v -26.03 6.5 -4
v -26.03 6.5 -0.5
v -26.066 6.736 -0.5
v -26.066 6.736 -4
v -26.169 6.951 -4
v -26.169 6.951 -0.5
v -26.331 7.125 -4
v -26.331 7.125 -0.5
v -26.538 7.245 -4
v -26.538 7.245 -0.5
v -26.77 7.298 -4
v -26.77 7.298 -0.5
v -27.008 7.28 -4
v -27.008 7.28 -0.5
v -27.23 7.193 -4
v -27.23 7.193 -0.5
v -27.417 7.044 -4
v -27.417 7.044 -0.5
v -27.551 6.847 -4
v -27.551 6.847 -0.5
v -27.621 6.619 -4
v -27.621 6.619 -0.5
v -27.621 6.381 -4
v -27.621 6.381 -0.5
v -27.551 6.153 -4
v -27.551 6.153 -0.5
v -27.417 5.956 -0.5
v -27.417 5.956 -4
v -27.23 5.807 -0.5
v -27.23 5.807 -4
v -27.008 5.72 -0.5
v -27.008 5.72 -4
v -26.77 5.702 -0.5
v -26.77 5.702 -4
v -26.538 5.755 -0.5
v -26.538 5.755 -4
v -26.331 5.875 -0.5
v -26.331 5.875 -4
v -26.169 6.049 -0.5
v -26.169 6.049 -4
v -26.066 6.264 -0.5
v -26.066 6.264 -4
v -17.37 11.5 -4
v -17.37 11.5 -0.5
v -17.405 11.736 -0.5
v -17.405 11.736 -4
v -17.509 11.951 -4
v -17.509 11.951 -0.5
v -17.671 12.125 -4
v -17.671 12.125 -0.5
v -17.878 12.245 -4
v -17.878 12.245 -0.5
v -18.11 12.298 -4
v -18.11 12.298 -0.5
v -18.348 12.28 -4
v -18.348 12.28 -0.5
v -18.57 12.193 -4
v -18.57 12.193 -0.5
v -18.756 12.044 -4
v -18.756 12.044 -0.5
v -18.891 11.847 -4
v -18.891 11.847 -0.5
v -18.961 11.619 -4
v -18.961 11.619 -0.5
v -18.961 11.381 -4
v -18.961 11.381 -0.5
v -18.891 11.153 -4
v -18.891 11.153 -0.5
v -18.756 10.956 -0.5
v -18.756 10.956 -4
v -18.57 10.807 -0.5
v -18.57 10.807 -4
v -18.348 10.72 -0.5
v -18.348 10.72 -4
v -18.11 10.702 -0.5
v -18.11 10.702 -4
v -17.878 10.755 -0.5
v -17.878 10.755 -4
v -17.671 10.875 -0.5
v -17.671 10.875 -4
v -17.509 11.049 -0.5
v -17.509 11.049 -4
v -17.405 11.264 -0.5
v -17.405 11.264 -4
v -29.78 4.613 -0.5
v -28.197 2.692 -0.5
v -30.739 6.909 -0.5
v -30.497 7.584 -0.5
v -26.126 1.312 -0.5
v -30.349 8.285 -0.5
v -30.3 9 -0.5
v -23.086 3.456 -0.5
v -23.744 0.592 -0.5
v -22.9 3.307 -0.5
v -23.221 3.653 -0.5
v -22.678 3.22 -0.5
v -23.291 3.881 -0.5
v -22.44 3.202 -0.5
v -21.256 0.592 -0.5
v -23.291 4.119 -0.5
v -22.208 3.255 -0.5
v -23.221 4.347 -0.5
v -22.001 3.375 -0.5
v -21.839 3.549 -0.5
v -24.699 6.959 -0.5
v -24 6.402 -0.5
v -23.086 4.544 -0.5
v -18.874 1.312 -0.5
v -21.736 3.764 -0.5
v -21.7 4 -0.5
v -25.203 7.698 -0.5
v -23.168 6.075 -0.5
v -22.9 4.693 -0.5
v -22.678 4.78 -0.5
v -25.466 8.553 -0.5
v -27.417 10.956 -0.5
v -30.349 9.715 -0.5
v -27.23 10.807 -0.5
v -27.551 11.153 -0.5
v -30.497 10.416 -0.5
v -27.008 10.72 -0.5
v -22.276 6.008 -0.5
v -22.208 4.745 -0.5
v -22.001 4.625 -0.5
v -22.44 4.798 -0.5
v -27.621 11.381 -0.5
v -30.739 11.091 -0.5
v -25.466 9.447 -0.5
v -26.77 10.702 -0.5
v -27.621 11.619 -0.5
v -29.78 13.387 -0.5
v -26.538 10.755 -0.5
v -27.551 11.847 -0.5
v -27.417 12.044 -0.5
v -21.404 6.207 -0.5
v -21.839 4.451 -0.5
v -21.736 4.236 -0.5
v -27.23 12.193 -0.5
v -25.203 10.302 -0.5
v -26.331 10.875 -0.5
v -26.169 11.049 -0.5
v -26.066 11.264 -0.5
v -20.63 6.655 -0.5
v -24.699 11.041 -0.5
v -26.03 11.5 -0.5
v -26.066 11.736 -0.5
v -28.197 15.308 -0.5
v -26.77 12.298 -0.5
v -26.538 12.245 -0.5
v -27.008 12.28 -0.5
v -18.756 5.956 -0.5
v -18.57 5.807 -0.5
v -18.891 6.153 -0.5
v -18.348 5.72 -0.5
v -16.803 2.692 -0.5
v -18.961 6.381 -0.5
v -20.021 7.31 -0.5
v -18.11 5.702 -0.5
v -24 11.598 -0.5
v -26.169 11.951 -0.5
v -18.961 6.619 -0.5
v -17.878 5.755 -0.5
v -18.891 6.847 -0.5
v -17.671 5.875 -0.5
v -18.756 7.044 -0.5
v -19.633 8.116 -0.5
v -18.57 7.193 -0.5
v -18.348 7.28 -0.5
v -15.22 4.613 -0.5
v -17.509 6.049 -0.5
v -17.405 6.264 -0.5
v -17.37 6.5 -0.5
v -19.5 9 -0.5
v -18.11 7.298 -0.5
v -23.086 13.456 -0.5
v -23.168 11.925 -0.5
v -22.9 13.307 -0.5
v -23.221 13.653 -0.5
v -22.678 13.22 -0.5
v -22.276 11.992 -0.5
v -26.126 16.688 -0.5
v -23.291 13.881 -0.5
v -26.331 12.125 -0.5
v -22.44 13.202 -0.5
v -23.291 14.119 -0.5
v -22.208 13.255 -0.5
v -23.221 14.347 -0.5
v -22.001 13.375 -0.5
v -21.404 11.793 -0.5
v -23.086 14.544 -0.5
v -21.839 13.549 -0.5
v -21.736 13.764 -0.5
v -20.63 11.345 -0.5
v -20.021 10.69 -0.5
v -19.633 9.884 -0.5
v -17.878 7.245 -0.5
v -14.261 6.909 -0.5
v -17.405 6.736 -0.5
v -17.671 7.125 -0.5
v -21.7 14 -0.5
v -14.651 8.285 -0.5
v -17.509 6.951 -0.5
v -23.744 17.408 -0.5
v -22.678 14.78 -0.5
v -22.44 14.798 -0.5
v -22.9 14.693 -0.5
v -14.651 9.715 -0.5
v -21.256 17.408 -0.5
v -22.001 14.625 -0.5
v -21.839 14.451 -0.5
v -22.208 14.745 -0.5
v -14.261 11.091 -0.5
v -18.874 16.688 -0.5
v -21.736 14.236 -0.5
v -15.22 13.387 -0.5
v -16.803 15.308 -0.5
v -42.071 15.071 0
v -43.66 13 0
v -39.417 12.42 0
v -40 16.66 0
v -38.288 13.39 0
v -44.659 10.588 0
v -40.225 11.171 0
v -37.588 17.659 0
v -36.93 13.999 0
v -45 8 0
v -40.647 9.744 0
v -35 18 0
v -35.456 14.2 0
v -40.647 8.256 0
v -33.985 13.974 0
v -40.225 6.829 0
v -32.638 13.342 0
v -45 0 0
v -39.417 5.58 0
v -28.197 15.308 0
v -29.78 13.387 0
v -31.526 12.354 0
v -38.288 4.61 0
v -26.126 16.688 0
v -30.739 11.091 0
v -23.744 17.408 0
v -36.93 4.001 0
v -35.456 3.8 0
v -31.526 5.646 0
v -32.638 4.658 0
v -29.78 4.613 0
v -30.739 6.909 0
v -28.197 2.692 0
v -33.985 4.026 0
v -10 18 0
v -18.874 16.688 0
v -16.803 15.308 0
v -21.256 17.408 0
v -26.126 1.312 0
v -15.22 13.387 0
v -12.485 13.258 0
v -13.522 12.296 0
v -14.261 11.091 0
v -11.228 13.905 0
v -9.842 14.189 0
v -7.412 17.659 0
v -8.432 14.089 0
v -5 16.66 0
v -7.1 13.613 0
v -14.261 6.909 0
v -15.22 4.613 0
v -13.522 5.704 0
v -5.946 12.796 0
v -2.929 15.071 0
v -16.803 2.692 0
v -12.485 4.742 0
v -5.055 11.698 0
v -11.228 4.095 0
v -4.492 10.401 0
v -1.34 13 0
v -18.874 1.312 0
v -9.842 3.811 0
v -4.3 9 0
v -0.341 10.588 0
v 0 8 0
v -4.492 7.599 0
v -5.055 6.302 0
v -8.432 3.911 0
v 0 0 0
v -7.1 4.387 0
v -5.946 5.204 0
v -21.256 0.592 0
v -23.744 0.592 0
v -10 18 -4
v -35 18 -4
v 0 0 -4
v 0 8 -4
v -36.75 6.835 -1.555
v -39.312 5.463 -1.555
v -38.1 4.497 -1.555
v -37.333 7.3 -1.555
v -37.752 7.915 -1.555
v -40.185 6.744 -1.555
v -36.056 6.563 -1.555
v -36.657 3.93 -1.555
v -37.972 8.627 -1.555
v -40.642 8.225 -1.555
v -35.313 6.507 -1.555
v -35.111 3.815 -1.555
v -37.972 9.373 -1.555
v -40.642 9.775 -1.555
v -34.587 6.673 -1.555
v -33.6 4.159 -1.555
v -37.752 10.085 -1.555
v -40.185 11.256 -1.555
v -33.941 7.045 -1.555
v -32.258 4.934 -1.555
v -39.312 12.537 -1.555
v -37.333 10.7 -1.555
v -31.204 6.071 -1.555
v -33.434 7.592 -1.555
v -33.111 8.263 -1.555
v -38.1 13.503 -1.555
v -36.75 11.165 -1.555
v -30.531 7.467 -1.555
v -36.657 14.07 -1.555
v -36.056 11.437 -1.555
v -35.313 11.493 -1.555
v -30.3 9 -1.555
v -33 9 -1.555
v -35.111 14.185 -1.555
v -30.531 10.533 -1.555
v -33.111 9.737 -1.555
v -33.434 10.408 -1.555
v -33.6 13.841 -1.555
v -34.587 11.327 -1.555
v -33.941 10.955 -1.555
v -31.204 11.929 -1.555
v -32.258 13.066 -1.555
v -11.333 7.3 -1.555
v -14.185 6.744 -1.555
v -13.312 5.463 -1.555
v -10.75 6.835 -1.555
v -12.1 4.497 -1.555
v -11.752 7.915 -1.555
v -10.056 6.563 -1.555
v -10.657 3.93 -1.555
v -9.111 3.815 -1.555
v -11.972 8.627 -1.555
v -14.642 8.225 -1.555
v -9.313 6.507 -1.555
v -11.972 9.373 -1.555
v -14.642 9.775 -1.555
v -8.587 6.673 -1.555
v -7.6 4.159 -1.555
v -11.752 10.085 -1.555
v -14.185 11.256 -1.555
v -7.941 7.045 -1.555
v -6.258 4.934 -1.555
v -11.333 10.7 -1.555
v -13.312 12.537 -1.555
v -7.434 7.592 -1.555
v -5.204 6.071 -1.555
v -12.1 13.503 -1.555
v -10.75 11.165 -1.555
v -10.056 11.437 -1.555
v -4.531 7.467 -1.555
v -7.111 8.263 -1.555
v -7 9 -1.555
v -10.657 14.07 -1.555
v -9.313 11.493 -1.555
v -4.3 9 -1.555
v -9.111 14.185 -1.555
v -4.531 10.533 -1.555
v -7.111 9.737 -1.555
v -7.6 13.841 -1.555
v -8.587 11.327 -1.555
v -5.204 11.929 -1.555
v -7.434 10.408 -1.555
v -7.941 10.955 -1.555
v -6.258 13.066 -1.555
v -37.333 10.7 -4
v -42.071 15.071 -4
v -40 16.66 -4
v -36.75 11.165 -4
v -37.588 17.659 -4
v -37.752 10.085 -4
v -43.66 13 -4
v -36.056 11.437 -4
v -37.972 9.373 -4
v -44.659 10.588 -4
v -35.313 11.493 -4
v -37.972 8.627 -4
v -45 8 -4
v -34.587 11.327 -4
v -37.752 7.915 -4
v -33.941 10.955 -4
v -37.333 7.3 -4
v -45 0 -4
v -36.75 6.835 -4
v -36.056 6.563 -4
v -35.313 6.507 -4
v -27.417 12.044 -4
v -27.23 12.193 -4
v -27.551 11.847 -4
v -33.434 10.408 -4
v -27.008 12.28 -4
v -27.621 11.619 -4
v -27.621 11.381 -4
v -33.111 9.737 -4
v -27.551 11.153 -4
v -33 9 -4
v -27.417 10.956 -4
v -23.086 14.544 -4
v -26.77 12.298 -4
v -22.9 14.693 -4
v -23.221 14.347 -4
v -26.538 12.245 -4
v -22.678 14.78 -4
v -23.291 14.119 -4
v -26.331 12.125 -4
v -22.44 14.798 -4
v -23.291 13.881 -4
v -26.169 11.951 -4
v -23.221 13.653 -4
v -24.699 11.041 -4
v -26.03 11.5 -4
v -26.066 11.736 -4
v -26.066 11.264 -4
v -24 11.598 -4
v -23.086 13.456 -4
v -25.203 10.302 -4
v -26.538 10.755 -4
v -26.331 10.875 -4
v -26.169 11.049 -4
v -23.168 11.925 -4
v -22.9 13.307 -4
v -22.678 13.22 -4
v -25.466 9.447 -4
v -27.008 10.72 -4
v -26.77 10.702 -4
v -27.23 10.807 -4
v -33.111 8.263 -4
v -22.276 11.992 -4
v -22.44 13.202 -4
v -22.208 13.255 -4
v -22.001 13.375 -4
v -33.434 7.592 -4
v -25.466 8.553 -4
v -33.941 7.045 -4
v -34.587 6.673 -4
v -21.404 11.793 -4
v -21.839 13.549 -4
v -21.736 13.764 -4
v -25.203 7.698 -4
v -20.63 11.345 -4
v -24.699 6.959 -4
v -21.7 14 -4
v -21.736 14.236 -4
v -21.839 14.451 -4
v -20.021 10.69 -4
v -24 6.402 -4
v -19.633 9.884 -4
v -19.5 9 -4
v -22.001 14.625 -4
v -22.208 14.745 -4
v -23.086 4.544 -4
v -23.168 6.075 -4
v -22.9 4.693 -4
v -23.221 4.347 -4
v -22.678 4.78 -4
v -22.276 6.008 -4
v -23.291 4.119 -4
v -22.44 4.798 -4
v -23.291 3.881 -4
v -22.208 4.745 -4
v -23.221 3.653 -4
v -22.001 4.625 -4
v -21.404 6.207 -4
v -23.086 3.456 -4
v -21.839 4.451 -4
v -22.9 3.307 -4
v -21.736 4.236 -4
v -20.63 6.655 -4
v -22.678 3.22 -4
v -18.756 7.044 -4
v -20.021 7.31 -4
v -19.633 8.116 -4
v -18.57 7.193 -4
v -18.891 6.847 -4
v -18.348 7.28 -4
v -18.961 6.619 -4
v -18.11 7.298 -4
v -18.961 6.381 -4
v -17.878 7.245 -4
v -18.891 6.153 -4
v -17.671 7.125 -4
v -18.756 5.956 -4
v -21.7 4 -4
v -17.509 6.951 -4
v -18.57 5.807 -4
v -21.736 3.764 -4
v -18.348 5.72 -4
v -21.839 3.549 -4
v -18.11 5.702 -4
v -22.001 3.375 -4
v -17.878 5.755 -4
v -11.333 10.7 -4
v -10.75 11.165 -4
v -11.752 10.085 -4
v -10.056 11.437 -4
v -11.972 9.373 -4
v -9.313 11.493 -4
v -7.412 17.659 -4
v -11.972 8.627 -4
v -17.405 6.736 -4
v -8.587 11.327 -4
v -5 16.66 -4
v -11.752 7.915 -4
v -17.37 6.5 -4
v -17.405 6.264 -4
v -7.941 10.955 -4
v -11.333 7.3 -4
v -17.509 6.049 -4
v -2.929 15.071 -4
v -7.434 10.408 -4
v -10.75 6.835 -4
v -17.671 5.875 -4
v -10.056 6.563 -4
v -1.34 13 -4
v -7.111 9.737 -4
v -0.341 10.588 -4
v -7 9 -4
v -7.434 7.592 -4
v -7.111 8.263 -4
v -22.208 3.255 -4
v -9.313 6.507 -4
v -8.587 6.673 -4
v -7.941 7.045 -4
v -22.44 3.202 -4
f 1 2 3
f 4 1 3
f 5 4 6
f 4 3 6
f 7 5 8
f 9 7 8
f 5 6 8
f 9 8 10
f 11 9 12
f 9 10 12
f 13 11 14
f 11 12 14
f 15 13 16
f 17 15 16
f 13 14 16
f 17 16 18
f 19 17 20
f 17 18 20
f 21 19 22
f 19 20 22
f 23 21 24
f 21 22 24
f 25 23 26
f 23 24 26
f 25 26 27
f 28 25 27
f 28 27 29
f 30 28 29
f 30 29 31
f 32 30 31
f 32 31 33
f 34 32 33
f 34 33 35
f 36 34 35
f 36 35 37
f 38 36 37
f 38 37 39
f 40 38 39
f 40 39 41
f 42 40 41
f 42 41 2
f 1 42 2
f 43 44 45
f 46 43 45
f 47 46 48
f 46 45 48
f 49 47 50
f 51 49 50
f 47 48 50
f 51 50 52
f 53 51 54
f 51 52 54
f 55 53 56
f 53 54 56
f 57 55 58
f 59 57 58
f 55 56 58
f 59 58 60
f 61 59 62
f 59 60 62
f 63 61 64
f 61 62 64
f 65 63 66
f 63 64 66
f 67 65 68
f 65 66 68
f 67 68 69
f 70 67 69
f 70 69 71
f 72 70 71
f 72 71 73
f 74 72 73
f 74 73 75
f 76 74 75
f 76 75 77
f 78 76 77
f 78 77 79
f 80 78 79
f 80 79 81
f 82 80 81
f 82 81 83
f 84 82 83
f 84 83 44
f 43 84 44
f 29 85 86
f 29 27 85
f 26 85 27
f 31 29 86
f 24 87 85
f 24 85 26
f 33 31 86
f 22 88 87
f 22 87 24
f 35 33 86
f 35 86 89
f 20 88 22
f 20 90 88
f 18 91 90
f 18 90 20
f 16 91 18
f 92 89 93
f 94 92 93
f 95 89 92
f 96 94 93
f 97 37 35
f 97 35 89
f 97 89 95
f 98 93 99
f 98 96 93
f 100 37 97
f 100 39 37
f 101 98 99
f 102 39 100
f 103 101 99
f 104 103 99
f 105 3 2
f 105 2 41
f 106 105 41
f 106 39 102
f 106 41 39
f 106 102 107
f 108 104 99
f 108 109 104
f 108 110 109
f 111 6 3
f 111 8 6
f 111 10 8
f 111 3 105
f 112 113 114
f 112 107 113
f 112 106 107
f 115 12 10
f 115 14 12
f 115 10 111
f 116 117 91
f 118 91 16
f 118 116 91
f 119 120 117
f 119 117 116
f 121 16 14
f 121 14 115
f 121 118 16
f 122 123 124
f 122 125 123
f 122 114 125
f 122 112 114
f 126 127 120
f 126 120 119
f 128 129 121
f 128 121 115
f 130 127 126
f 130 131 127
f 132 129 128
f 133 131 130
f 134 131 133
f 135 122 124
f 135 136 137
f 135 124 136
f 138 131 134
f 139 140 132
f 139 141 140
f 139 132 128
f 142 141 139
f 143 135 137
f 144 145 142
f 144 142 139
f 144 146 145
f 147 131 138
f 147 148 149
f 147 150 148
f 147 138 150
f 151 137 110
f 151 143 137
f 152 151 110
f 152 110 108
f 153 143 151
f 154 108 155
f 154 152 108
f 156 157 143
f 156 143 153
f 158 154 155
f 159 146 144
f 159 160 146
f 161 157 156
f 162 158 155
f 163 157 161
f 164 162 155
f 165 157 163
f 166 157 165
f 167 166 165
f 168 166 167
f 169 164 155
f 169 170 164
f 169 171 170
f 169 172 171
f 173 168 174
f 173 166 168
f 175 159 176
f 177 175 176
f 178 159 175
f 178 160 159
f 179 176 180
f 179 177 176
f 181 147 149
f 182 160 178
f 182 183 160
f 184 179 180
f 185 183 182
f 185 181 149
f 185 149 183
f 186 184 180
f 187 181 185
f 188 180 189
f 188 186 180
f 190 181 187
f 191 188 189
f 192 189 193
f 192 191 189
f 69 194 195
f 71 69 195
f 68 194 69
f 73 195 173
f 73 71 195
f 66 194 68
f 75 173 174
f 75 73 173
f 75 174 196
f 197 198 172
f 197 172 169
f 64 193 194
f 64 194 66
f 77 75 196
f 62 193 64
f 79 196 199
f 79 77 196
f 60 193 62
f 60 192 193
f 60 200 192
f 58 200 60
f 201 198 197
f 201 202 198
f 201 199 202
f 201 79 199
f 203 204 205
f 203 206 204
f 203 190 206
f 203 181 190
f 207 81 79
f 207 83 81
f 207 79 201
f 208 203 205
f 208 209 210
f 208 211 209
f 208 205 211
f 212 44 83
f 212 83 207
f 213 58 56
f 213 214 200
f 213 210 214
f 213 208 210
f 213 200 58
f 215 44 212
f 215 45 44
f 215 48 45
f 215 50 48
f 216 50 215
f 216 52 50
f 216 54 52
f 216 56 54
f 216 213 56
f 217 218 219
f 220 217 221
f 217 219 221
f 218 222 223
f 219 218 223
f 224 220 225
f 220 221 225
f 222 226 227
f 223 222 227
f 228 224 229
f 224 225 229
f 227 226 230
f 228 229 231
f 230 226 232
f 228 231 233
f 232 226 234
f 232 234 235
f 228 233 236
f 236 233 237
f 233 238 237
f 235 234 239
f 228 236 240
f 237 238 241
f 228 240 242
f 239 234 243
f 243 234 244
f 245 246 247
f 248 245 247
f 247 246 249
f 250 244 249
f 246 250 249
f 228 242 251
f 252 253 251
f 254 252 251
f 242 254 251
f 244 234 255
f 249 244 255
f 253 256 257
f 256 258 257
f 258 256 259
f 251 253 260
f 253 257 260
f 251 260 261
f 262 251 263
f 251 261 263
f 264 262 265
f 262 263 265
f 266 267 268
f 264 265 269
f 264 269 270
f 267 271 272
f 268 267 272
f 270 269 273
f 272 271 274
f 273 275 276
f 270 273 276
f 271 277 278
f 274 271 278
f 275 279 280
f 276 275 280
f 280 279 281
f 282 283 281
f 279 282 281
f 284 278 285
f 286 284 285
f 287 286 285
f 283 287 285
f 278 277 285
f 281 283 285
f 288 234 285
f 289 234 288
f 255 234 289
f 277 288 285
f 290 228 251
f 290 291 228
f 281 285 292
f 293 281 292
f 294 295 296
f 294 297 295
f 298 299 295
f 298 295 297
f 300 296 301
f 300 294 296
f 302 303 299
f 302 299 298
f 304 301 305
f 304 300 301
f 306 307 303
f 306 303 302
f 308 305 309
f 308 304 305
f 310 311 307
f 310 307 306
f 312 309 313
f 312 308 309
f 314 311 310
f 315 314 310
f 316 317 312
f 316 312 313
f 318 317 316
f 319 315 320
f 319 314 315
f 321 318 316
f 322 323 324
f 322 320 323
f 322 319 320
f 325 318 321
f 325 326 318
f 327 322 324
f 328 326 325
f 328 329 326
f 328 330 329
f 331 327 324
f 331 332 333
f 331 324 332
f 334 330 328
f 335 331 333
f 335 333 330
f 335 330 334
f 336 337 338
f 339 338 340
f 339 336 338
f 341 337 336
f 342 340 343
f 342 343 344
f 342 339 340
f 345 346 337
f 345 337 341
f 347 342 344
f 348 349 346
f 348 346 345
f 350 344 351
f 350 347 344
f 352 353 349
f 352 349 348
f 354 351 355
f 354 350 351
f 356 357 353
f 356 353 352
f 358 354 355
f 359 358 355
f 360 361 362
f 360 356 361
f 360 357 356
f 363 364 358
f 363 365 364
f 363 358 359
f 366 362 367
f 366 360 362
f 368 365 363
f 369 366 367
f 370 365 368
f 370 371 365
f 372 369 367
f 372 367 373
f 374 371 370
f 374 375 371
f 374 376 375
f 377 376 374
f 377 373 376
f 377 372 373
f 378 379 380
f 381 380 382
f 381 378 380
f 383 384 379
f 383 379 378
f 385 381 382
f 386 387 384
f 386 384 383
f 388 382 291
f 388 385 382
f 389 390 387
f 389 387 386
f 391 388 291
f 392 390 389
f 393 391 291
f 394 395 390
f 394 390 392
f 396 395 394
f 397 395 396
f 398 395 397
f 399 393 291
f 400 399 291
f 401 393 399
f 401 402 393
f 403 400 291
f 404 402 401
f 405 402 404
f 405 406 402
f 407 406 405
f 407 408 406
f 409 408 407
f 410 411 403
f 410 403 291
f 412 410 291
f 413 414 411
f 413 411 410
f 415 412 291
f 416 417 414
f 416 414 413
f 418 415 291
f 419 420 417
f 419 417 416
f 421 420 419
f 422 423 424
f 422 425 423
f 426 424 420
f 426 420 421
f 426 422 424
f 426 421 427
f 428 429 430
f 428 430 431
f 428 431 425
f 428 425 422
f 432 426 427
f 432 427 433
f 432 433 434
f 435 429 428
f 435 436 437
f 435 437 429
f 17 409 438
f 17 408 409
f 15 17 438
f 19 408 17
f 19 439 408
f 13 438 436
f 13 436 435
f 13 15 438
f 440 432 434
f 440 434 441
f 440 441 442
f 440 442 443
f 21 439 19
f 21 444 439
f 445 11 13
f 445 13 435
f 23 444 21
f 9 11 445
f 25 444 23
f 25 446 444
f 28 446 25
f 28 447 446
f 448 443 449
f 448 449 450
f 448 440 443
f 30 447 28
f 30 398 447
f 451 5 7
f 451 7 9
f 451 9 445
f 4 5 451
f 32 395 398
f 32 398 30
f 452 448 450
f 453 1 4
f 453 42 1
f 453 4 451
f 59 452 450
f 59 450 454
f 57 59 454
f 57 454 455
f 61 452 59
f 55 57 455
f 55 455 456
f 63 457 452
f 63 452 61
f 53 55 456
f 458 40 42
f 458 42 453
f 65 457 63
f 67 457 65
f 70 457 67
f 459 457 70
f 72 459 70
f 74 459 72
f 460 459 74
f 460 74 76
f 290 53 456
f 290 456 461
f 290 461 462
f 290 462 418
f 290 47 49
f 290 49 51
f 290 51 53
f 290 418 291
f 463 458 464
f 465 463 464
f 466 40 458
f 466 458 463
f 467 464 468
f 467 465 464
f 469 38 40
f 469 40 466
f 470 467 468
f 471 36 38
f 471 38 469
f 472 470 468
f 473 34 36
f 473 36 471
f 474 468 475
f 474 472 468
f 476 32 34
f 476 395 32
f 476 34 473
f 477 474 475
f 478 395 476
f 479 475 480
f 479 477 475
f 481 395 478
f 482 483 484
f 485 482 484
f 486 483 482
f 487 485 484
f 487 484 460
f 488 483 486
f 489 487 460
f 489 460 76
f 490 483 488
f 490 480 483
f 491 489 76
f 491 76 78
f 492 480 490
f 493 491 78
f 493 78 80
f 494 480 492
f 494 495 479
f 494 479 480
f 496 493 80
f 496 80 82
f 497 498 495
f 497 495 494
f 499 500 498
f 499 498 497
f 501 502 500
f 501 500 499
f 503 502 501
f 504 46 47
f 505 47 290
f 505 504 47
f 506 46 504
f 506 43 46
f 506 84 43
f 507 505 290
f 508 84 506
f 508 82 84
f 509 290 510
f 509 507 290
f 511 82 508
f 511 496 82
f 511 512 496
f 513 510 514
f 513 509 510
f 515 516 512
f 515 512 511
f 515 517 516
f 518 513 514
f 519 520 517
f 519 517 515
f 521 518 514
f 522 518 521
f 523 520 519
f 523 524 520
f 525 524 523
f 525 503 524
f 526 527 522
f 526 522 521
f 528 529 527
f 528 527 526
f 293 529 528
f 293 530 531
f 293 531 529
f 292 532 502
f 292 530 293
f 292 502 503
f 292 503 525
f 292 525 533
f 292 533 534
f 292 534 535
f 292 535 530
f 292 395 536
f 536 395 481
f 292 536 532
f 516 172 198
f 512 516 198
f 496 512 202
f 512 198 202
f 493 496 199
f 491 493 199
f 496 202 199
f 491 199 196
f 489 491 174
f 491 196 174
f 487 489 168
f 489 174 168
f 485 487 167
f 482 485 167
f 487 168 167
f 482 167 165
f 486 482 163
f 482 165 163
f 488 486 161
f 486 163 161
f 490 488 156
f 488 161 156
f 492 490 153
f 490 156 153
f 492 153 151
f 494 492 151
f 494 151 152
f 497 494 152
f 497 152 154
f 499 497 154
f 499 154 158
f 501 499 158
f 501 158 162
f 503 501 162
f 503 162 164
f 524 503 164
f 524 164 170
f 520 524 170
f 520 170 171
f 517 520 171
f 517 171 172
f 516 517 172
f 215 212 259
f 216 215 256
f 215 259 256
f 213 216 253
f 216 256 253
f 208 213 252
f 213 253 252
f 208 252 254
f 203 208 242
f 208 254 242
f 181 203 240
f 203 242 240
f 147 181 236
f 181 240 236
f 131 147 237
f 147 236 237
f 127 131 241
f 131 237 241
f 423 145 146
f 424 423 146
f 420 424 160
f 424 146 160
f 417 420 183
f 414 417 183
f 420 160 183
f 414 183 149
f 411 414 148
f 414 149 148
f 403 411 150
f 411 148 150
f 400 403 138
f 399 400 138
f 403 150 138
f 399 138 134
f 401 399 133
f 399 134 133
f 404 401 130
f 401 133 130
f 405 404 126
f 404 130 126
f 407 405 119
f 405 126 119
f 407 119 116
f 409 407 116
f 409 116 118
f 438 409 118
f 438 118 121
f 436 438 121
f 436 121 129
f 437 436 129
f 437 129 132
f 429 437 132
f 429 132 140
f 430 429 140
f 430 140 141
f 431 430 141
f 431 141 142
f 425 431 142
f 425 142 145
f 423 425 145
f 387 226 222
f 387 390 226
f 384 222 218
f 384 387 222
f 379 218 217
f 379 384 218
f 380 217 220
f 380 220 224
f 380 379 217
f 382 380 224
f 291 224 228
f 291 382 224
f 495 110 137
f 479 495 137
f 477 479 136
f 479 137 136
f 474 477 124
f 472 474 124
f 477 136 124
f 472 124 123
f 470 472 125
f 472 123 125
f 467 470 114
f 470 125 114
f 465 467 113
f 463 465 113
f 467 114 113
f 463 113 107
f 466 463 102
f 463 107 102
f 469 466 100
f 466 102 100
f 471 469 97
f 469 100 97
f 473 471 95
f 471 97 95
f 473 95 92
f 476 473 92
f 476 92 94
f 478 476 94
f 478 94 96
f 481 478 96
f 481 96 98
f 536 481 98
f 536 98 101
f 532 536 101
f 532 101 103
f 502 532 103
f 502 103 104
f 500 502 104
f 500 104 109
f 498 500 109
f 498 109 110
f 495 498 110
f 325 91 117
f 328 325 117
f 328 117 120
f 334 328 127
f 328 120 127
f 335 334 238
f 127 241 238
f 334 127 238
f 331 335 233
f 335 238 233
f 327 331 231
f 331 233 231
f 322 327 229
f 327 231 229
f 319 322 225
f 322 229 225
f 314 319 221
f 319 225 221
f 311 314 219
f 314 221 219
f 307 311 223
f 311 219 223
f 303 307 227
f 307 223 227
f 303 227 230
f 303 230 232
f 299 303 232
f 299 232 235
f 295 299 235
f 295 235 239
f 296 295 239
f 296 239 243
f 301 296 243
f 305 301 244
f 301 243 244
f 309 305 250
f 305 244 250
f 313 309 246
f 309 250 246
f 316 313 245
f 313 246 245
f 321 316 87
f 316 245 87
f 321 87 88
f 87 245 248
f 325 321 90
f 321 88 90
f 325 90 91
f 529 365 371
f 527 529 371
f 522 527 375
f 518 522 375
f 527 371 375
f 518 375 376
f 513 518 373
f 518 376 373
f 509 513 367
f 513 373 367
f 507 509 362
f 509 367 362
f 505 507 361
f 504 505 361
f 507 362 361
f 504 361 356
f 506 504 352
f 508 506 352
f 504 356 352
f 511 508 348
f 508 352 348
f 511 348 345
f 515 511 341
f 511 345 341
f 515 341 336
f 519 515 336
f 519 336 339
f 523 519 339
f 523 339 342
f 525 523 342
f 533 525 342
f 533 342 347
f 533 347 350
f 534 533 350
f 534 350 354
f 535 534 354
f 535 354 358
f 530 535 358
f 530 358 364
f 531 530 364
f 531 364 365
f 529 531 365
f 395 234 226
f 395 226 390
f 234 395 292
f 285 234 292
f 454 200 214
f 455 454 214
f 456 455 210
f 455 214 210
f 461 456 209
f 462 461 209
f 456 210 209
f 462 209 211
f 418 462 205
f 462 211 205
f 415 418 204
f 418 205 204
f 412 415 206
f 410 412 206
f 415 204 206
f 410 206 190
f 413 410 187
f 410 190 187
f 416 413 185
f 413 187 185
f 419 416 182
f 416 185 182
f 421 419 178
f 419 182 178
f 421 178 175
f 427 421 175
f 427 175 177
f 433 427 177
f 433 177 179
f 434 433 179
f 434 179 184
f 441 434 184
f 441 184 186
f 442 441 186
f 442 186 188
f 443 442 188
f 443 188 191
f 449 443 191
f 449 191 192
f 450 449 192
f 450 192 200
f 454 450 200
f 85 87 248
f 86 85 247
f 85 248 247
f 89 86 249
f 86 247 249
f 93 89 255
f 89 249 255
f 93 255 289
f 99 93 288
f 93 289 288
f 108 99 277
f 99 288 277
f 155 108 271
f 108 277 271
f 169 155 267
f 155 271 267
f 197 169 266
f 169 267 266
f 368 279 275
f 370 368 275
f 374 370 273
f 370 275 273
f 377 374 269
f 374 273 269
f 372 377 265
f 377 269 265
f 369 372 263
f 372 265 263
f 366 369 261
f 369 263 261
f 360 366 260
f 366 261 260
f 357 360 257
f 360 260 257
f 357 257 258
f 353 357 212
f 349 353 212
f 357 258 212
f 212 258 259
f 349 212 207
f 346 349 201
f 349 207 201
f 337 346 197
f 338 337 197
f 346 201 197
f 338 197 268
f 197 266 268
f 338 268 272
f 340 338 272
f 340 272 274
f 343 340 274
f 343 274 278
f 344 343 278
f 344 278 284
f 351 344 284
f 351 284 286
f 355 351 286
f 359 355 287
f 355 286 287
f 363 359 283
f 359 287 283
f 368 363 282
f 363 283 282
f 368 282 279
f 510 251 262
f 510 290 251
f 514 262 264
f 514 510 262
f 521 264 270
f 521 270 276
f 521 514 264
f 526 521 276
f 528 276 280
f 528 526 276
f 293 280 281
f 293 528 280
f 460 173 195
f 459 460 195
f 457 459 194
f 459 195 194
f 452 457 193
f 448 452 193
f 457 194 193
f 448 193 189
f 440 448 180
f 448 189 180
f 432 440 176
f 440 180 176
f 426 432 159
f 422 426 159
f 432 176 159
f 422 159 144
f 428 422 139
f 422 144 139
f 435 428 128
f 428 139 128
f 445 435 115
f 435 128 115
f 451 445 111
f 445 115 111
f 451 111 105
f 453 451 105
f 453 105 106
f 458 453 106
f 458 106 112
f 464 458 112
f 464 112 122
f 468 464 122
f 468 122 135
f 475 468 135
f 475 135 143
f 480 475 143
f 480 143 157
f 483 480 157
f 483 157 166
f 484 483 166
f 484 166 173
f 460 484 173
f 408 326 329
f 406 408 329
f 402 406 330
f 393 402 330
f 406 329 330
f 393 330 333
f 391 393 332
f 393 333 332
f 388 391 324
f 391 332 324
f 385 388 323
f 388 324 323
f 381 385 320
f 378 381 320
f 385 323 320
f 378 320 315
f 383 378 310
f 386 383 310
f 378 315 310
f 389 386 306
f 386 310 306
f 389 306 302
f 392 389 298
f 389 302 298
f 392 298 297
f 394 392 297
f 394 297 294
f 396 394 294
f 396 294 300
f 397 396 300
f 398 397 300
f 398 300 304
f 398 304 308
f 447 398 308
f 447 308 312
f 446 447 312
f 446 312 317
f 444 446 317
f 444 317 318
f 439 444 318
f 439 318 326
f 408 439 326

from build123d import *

# Parameters (mm, degrees)
SKETCH1_W           = 45
SKETCH1_H           = 4
BOSS_EXTRUDE1_DEPTH = 18
SKETCH2_R           = 8.5
CUT_EXTRUDE2_DEPTH  = 0.5
SKETCH3_R           = 3
CUT_EXTRUDE3_DEPTH  = 4.5
SKETCH4_R           = 2.5
CUT_EXTRUDE4_DEPTH  = 5
SKETCH6_R           = 0.8
CUT_EXTRUDE6_DEPTH  = 4.5
FILLET1_R           = 10
SKETCH7_R           = 5.2
CUT_EXTRUDE7_DEPTH  = 1.555


with BuildPart() as part:
    # Sketch1 → Boss-Extrude1 (new body)
    with BuildSketch(Plane(origin=(0, 0, 0), x_dir=(1, 0, 0), z_dir=(0, 1, 0))):
        with Locations((-22.5, 2)):
            Rectangle(SKETCH1_W, SKETCH1_H)
    extrude(amount=BOSS_EXTRUDE1_DEPTH)

    # Sketch2 → Cut-Extrude2 (cut)
    with BuildSketch(Plane.XY):
        with Locations((-22.5, 9)):
            Circle(SKETCH2_R)
    extrude(amount=-CUT_EXTRUDE2_DEPTH, mode=Mode.SUBTRACT)

    # Sketch3 → Cut-Extrude3 (cut, through all)
    with BuildSketch(Plane.XY.offset(-0.5)):
        with Locations((-22.5, 9)):
            Circle(SKETCH3_R)
    extrude(amount=-CUT_EXTRUDE3_DEPTH, mode=Mode.SUBTRACT)

    # Sketch4 → Cut-Extrude4 (cut, through all)
    with BuildSketch(Plane.XY):
        with Locations((-35.5, 9)):
            Circle(SKETCH4_R)
        with Locations((-9.5, 9)):
            Circle(SKETCH4_R)
    extrude(amount=-CUT_EXTRUDE4_DEPTH, mode=Mode.SUBTRACT)

    # Sketch6 → Cut-Extrude6 (cut, through all)
    with BuildSketch(Plane.XY.offset(-0.5)):
        with Locations((-22.5, 14)):
            Circle(SKETCH6_R)
        with Locations((-18.169872981, 11.5)):
            Circle(SKETCH6_R)
        with Locations((-18.169872981, 6.5)):
            Circle(SKETCH6_R)
        with Locations((-22.5, 4)):
            Circle(SKETCH6_R)
        with Locations((-26.830127019, 6.5)):
            Circle(SKETCH6_R)
        with Locations((-26.830127019, 11.5)):
            Circle(SKETCH6_R)
    extrude(amount=-CUT_EXTRUDE6_DEPTH, mode=Mode.SUBTRACT)

    # Fillet1
    fillet1_edges = [part.edges().sort_by_distance(p)[0] for p in [
        (-45, 18, -2),
        (0, 18, -2),
    ]]
    fillet(fillet1_edges, radius=FILLET1_R)

    # Sketch7 → Cut-Extrude7 (cut)
    with BuildSketch(Plane.XY):
        with Locations((-35.5, 9)):
            Circle(SKETCH7_R)
        with Locations((-9.5, 9)):
            Circle(SKETCH7_R)
    extrude(amount=-CUT_EXTRUDE7_DEPTH, mode=Mode.SUBTRACT)


solid = part.part
